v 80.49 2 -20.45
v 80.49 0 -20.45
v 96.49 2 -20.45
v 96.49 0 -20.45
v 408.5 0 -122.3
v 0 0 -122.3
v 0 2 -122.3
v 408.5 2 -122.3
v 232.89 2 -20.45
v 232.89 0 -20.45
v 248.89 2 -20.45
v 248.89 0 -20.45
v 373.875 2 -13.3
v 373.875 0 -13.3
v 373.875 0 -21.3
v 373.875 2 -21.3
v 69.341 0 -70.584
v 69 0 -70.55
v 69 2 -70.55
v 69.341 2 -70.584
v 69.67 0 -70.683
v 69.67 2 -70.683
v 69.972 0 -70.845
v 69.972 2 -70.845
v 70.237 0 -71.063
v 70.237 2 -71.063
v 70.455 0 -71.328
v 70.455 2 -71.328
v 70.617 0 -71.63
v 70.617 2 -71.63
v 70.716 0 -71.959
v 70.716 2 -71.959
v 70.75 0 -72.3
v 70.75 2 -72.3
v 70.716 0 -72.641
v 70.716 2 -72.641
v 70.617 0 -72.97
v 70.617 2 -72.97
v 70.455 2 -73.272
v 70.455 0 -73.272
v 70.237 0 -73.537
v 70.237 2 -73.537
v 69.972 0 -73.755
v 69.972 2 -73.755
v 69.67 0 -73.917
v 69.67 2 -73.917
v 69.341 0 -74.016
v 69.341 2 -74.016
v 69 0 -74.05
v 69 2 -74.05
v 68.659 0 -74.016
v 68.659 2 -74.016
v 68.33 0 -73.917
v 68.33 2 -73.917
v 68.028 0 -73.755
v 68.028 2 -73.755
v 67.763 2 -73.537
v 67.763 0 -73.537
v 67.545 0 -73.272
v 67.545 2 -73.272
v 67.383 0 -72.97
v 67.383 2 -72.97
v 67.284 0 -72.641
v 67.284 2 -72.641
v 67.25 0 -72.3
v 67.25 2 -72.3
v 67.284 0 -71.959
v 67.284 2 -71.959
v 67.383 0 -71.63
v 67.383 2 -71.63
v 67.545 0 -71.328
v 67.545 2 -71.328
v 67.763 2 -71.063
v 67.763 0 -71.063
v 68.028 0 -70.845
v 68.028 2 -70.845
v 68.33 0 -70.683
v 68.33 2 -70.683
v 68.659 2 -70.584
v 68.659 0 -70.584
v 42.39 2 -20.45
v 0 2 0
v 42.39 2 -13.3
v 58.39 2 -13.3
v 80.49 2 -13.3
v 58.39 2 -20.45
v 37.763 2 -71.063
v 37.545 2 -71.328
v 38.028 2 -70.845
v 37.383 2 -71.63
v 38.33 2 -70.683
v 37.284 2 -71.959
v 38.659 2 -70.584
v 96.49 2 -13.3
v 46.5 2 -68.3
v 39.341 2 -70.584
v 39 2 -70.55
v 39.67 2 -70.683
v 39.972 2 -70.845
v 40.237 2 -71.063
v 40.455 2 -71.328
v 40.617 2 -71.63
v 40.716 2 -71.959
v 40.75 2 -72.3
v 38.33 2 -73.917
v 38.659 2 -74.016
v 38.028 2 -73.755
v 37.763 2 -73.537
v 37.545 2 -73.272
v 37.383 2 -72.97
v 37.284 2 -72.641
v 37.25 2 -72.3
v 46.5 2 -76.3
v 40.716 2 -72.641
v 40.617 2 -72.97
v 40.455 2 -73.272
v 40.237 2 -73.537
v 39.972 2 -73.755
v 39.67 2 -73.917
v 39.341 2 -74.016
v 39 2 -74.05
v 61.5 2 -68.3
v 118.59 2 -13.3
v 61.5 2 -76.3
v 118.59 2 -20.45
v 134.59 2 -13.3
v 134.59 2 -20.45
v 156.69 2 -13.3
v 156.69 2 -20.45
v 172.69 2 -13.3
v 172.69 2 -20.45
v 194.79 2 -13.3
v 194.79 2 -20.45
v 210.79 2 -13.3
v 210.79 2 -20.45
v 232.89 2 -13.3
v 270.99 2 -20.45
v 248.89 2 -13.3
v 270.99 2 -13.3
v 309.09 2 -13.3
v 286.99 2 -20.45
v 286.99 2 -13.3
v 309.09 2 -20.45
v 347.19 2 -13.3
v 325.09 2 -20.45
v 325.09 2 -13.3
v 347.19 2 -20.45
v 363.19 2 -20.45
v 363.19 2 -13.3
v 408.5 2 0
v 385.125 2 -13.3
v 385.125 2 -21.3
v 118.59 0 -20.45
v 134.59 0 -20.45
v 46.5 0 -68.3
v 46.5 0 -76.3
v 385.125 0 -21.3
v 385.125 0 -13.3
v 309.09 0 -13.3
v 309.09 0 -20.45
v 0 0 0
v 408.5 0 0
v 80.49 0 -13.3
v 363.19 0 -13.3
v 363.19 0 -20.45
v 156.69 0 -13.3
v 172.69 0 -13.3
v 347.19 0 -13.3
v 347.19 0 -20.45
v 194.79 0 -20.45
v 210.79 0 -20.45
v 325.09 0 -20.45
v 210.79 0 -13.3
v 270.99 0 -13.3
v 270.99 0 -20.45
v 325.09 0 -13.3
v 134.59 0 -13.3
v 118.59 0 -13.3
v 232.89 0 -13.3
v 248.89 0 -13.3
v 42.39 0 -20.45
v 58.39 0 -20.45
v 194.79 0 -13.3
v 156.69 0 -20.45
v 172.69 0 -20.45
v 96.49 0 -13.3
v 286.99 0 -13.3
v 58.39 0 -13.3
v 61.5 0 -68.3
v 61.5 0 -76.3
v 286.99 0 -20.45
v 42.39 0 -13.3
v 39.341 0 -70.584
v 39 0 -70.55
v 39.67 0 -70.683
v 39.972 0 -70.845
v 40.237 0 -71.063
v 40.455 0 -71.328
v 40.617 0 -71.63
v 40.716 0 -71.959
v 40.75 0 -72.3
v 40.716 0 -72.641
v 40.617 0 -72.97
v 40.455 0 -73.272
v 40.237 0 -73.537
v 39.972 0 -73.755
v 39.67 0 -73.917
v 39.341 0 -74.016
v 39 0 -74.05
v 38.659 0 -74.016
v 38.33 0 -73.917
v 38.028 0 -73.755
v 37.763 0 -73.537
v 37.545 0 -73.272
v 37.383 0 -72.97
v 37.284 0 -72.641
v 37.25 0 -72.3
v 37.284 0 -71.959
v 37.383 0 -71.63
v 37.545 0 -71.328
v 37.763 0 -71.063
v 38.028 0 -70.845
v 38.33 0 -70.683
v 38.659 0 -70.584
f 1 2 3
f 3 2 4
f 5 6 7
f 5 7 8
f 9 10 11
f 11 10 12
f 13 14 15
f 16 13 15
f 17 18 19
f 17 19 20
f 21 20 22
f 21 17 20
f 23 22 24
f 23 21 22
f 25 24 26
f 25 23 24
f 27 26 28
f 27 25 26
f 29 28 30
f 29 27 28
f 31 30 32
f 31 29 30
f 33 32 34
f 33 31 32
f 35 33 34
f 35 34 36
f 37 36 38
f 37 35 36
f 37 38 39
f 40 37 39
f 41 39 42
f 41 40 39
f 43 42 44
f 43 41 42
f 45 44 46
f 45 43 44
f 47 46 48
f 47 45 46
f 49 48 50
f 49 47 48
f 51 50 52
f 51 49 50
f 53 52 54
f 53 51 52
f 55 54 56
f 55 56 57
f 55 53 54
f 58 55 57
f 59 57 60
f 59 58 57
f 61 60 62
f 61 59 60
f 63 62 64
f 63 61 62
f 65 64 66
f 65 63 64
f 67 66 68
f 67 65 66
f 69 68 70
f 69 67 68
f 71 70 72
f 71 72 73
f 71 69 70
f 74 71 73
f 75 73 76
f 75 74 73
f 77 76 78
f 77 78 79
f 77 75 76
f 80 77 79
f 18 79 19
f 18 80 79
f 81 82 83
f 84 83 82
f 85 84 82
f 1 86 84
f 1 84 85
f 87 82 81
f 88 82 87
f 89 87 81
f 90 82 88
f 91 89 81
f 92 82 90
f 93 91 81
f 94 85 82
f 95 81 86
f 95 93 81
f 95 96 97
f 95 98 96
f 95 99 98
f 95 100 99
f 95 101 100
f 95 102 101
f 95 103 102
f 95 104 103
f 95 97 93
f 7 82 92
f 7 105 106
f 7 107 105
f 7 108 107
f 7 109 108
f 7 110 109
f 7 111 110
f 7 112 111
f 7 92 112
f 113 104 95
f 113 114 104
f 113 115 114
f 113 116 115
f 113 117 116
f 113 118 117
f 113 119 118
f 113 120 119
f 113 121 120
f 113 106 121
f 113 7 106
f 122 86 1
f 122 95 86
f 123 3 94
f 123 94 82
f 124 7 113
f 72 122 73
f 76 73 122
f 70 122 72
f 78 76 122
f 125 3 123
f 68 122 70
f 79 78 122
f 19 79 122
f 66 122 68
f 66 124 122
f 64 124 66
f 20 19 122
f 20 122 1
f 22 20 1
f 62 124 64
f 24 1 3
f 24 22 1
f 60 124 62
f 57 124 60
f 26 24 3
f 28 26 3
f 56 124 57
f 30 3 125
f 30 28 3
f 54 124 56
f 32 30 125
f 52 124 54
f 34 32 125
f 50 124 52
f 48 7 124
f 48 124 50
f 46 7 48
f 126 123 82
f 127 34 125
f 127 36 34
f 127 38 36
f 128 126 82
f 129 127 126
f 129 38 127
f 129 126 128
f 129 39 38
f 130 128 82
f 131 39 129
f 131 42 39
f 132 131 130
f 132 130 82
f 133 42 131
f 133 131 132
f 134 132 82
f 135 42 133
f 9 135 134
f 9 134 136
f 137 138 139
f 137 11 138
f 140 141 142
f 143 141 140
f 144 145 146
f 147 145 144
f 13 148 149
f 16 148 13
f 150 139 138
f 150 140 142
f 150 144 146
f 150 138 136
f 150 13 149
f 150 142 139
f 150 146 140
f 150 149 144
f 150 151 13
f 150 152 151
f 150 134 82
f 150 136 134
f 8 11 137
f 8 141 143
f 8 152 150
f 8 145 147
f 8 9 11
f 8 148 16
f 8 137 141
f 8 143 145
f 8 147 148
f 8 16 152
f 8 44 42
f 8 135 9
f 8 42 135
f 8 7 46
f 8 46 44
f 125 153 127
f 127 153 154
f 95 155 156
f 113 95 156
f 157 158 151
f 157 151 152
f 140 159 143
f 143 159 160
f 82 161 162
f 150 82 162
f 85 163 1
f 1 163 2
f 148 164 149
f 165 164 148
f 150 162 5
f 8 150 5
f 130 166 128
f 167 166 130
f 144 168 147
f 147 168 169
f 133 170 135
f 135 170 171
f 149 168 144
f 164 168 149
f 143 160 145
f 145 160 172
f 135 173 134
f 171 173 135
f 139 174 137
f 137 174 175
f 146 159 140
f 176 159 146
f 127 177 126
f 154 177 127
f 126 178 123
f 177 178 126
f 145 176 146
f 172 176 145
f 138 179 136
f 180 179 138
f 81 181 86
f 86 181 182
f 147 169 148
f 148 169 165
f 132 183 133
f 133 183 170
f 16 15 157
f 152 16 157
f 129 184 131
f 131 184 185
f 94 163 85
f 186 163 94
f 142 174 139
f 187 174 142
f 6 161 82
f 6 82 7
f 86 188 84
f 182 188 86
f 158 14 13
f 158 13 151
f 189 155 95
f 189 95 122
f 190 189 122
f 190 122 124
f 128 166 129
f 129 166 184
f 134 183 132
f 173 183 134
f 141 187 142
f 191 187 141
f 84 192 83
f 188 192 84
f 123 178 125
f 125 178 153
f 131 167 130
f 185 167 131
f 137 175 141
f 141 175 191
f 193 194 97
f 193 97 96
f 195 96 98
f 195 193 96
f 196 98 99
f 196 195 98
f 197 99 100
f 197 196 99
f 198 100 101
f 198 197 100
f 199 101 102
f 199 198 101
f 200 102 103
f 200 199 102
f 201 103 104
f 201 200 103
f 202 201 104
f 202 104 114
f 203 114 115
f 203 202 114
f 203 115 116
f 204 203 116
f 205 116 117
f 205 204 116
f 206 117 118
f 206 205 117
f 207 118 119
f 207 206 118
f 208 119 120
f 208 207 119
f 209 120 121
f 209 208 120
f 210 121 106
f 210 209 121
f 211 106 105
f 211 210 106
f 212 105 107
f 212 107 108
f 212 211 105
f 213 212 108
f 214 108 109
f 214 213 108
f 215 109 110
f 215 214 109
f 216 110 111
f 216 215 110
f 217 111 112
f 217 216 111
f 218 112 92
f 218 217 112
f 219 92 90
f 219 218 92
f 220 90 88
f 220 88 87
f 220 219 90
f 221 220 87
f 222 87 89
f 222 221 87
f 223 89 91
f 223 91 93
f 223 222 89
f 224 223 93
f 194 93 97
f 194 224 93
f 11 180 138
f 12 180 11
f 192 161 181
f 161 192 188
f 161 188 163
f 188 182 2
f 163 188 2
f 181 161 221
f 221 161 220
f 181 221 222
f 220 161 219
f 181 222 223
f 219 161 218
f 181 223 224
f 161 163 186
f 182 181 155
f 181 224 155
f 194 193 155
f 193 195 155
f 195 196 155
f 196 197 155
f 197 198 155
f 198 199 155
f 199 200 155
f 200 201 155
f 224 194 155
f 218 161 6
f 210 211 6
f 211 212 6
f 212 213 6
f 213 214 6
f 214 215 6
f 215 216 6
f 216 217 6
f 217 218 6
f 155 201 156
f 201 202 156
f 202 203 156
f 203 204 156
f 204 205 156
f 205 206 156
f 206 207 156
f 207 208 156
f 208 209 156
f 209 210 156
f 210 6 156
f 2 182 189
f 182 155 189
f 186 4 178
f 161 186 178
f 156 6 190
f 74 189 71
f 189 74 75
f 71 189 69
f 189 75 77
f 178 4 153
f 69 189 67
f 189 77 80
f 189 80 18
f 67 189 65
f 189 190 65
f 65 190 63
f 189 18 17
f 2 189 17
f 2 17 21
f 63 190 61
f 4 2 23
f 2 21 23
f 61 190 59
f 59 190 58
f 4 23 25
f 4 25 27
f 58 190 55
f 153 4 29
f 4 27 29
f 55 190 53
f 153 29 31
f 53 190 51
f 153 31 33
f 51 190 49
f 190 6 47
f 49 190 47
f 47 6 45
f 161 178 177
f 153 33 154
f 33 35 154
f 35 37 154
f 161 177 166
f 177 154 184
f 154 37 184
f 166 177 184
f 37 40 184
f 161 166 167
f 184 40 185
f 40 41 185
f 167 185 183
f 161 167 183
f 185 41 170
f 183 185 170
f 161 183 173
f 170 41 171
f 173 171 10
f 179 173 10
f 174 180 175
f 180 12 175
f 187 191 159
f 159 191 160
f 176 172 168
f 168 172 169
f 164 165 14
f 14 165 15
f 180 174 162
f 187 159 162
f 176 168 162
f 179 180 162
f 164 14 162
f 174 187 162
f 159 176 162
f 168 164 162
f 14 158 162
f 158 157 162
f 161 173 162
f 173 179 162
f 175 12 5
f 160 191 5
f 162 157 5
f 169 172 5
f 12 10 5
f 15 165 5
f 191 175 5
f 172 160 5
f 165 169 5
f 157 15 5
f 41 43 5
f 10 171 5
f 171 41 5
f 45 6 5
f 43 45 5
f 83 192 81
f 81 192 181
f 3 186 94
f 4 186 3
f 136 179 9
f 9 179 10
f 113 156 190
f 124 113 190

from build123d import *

# Parameters (mm, degrees)
SKETCH1_W           = 408.5
SKETCH1_H           = 122.3
SKETCH1_R           = 1.75
SKETCH1_W_2         = 16
SKETCH1_H_2         = 7.15
SKETCH1_W_3         = 11.25
SKETCH1_H_3         = 8
SKETCH1_W_4         = 15
BOSS_EXTRUDE1_DEPTH = 2


with BuildPart() as part:
    # Sketch1 → Boss-Extrude1 (new body)
    with BuildSketch(Plane(origin=(0, 0, 0), x_dir=(1, 0, 0), z_dir=(0, 1, 0))):
        with Locations((204.25, 61.15)):
            Rectangle(SKETCH1_W, SKETCH1_H)
        with Locations(Location((39, 72.3, 0), (0, 0, 270))):
            Circle(SKETCH1_R, mode=Mode.SUBTRACT)
        with Locations(Location((69, 72.3, 0), (0, 0, 270))):
            Circle(SKETCH1_R, mode=Mode.SUBTRACT)
        with Locations((317.09, 16.875)):
            Rectangle(SKETCH1_W_2, SKETCH1_H_2, mode=Mode.SUBTRACT)
        with Locations((379.5, 17.3)):
            Rectangle(SKETCH1_W_3, SKETCH1_H_3, mode=Mode.SUBTRACT)
        with Locations((355.19, 16.875)):
            Rectangle(SKETCH1_W_2, SKETCH1_H_2, mode=Mode.SUBTRACT)
        with Locations((278.99, 16.875)):
            Rectangle(SKETCH1_W_2, SKETCH1_H_2, mode=Mode.SUBTRACT)
        with Locations((240.89, 16.875)):
            Rectangle(SKETCH1_W_2, SKETCH1_H_2, mode=Mode.SUBTRACT)
        with Locations((202.79, 16.875)):
            Rectangle(SKETCH1_W_2, SKETCH1_H_2, mode=Mode.SUBTRACT)
        with Locations((164.69, 16.875)):
            Rectangle(SKETCH1_W_2, SKETCH1_H_2, mode=Mode.SUBTRACT)
        with Locations((126.59, 16.875)):
            Rectangle(SKETCH1_W_2, SKETCH1_H_2, mode=Mode.SUBTRACT)
        with Locations((88.49, 16.875)):
            Rectangle(SKETCH1_W_2, SKETCH1_H_2, mode=Mode.SUBTRACT)
        with Locations((50.39, 16.875)):
            Rectangle(SKETCH1_W_2, SKETCH1_H_2, mode=Mode.SUBTRACT)
        with Locations((54, 72.3)):
            Rectangle(SKETCH1_W_4, SKETCH1_H_3, mode=Mode.SUBTRACT)
    extrude(amount=BOSS_EXTRUDE1_DEPTH)


solid = part.part
